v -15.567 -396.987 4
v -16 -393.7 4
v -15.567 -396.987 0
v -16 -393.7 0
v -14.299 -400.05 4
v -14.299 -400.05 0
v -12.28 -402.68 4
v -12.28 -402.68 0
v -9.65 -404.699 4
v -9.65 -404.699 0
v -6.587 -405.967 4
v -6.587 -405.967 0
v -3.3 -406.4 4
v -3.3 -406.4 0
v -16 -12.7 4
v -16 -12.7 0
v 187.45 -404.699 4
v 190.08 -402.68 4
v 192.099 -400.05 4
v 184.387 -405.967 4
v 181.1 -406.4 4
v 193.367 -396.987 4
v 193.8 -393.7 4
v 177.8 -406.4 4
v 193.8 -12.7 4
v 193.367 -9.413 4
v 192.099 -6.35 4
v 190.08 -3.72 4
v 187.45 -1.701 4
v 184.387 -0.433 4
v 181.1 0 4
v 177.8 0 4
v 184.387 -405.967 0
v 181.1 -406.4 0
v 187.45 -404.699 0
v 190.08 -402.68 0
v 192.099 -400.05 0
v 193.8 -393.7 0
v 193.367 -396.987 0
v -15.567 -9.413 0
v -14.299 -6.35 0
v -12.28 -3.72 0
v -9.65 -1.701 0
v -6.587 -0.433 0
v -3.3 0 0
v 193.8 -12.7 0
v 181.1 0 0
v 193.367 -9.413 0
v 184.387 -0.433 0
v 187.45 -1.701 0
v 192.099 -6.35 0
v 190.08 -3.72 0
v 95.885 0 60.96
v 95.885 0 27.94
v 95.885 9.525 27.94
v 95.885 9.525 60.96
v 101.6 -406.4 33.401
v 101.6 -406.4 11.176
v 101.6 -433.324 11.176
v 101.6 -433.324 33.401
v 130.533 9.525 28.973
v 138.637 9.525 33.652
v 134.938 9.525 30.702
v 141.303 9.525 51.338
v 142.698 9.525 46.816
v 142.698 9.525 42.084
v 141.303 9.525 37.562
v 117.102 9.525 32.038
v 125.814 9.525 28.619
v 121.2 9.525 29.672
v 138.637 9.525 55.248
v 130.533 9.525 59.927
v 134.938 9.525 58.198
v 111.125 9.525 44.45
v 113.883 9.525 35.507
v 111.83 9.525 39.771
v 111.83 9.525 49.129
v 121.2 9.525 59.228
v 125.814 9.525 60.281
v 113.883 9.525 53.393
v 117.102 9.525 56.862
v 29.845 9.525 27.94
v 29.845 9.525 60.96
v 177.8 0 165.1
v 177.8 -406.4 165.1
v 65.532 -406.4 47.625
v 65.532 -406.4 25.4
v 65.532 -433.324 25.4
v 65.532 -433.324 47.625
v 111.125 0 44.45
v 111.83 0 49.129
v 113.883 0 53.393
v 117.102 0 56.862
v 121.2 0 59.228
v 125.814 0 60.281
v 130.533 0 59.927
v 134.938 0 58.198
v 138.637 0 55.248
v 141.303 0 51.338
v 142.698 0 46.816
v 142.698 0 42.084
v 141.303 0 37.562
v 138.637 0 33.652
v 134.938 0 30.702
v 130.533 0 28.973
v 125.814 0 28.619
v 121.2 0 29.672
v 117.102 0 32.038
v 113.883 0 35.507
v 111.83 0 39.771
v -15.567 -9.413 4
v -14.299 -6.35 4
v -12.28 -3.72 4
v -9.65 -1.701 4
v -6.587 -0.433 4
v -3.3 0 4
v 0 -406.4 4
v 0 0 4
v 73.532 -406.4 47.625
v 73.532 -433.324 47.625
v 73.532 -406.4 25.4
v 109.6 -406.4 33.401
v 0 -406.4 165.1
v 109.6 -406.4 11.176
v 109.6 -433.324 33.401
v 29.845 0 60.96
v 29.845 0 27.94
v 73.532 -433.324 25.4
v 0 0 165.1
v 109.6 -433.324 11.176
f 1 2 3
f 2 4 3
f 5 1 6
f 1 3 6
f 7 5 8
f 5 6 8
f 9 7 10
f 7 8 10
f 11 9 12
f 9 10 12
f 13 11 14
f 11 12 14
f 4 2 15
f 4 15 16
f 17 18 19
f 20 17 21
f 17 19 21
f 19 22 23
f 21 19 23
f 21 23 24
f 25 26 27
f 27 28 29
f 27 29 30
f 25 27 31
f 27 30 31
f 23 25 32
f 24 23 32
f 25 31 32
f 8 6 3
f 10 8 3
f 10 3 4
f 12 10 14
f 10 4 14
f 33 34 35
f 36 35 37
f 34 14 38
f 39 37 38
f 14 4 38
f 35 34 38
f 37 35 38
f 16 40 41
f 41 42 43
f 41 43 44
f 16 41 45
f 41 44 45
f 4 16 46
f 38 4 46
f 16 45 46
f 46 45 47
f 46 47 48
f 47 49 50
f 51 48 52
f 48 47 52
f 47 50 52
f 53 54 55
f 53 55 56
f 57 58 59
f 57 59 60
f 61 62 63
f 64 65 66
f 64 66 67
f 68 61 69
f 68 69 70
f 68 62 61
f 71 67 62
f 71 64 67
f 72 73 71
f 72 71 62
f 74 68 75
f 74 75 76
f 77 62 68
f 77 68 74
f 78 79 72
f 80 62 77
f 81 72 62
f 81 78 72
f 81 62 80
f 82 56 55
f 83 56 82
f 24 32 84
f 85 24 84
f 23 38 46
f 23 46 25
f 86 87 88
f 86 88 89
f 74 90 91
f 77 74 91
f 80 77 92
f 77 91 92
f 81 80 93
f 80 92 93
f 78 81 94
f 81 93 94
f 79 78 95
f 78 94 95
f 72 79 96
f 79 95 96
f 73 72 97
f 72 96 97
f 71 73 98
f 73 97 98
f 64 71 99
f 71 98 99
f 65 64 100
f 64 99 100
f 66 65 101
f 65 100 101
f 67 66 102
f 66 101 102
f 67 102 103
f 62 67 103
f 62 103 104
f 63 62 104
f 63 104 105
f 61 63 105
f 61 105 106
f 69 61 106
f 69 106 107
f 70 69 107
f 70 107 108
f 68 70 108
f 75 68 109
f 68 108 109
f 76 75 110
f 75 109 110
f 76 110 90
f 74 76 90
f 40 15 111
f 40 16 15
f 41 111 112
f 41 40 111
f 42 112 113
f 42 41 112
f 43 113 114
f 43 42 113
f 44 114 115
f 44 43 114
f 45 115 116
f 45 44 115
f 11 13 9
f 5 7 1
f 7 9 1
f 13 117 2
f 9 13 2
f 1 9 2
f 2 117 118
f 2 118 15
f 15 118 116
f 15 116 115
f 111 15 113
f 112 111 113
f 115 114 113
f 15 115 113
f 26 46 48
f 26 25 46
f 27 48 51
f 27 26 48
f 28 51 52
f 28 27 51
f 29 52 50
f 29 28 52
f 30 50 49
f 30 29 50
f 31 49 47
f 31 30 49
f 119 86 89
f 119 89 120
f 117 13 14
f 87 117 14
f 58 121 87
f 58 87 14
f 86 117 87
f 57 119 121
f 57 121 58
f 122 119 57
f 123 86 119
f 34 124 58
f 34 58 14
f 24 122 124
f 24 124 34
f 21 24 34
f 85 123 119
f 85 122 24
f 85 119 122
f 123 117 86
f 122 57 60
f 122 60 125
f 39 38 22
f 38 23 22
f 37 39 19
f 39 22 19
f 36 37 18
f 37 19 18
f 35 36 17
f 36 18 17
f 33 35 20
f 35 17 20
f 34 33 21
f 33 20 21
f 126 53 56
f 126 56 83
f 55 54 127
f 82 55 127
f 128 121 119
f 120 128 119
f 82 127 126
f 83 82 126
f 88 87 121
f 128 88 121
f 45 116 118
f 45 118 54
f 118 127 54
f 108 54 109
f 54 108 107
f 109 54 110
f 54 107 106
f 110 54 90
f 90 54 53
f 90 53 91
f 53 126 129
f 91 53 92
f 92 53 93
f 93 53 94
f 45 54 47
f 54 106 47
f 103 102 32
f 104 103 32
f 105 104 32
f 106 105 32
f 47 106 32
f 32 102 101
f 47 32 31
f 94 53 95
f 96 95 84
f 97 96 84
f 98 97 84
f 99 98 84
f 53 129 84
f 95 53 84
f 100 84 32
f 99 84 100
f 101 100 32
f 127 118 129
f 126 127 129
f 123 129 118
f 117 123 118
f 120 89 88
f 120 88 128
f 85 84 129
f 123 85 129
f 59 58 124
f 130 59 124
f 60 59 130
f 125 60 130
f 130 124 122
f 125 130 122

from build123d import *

# Parameters (mm, degrees)
F1_DEPTH = 406.4
F2_R     = 12.7
F3_W     = 8
F3_H     = 22.225
F4_DEPTH = 26.924
F5_W     = 66.04
F5_H     = 33.02
F5_R     = 15.875
F6_DEPTH = 9.525


with BuildPart() as f1:
    # F0 (on Front) → F1 (new body)
    with BuildSketch(Plane.XZ):
        Polygon((-16, 0), (0, 0), (177.8, 0), (193.8, 0), (193.8, 4), (177.8, 4), (177.8, 165.1), (0, 165.1), (0, 4), (-16, 4), align=None)
    extrude(amount=F1_DEPTH)

    # F2
    f2_edges = [f1.edges().sort_by_distance(p)[0] for p in [
        (193.8, 0, 2),
        (193.8, -406.4, 2),
        (-16, -406.4, 2),
        (-16, 0, 2),
    ]]
    fillet(f2_edges, radius=F2_R)

    # F3 (on face) → F4 (join)
    with BuildSketch(Plane.XZ.offset(406.4)):
        with Locations((69.532, 36.5125)):
            Rectangle(F3_W, F3_H)
        with Locations((105.6, 22.2885)):
            Rectangle(F3_W, F3_H)
    extrude(amount=F4_DEPTH)

    # F5 (on face) → F6 (join)
    with BuildSketch(Plane(origin=(0, 0, 0), x_dir=(-1, 0, 0), z_dir=(0, 1, 0))):
        with Locations((-62.865, 44.45)):
            Rectangle(F5_W, F5_H)
        with Locations((-127, 44.45)):
            Circle(F5_R)
    extrude(amount=F6_DEPTH)


solid = f1.part
